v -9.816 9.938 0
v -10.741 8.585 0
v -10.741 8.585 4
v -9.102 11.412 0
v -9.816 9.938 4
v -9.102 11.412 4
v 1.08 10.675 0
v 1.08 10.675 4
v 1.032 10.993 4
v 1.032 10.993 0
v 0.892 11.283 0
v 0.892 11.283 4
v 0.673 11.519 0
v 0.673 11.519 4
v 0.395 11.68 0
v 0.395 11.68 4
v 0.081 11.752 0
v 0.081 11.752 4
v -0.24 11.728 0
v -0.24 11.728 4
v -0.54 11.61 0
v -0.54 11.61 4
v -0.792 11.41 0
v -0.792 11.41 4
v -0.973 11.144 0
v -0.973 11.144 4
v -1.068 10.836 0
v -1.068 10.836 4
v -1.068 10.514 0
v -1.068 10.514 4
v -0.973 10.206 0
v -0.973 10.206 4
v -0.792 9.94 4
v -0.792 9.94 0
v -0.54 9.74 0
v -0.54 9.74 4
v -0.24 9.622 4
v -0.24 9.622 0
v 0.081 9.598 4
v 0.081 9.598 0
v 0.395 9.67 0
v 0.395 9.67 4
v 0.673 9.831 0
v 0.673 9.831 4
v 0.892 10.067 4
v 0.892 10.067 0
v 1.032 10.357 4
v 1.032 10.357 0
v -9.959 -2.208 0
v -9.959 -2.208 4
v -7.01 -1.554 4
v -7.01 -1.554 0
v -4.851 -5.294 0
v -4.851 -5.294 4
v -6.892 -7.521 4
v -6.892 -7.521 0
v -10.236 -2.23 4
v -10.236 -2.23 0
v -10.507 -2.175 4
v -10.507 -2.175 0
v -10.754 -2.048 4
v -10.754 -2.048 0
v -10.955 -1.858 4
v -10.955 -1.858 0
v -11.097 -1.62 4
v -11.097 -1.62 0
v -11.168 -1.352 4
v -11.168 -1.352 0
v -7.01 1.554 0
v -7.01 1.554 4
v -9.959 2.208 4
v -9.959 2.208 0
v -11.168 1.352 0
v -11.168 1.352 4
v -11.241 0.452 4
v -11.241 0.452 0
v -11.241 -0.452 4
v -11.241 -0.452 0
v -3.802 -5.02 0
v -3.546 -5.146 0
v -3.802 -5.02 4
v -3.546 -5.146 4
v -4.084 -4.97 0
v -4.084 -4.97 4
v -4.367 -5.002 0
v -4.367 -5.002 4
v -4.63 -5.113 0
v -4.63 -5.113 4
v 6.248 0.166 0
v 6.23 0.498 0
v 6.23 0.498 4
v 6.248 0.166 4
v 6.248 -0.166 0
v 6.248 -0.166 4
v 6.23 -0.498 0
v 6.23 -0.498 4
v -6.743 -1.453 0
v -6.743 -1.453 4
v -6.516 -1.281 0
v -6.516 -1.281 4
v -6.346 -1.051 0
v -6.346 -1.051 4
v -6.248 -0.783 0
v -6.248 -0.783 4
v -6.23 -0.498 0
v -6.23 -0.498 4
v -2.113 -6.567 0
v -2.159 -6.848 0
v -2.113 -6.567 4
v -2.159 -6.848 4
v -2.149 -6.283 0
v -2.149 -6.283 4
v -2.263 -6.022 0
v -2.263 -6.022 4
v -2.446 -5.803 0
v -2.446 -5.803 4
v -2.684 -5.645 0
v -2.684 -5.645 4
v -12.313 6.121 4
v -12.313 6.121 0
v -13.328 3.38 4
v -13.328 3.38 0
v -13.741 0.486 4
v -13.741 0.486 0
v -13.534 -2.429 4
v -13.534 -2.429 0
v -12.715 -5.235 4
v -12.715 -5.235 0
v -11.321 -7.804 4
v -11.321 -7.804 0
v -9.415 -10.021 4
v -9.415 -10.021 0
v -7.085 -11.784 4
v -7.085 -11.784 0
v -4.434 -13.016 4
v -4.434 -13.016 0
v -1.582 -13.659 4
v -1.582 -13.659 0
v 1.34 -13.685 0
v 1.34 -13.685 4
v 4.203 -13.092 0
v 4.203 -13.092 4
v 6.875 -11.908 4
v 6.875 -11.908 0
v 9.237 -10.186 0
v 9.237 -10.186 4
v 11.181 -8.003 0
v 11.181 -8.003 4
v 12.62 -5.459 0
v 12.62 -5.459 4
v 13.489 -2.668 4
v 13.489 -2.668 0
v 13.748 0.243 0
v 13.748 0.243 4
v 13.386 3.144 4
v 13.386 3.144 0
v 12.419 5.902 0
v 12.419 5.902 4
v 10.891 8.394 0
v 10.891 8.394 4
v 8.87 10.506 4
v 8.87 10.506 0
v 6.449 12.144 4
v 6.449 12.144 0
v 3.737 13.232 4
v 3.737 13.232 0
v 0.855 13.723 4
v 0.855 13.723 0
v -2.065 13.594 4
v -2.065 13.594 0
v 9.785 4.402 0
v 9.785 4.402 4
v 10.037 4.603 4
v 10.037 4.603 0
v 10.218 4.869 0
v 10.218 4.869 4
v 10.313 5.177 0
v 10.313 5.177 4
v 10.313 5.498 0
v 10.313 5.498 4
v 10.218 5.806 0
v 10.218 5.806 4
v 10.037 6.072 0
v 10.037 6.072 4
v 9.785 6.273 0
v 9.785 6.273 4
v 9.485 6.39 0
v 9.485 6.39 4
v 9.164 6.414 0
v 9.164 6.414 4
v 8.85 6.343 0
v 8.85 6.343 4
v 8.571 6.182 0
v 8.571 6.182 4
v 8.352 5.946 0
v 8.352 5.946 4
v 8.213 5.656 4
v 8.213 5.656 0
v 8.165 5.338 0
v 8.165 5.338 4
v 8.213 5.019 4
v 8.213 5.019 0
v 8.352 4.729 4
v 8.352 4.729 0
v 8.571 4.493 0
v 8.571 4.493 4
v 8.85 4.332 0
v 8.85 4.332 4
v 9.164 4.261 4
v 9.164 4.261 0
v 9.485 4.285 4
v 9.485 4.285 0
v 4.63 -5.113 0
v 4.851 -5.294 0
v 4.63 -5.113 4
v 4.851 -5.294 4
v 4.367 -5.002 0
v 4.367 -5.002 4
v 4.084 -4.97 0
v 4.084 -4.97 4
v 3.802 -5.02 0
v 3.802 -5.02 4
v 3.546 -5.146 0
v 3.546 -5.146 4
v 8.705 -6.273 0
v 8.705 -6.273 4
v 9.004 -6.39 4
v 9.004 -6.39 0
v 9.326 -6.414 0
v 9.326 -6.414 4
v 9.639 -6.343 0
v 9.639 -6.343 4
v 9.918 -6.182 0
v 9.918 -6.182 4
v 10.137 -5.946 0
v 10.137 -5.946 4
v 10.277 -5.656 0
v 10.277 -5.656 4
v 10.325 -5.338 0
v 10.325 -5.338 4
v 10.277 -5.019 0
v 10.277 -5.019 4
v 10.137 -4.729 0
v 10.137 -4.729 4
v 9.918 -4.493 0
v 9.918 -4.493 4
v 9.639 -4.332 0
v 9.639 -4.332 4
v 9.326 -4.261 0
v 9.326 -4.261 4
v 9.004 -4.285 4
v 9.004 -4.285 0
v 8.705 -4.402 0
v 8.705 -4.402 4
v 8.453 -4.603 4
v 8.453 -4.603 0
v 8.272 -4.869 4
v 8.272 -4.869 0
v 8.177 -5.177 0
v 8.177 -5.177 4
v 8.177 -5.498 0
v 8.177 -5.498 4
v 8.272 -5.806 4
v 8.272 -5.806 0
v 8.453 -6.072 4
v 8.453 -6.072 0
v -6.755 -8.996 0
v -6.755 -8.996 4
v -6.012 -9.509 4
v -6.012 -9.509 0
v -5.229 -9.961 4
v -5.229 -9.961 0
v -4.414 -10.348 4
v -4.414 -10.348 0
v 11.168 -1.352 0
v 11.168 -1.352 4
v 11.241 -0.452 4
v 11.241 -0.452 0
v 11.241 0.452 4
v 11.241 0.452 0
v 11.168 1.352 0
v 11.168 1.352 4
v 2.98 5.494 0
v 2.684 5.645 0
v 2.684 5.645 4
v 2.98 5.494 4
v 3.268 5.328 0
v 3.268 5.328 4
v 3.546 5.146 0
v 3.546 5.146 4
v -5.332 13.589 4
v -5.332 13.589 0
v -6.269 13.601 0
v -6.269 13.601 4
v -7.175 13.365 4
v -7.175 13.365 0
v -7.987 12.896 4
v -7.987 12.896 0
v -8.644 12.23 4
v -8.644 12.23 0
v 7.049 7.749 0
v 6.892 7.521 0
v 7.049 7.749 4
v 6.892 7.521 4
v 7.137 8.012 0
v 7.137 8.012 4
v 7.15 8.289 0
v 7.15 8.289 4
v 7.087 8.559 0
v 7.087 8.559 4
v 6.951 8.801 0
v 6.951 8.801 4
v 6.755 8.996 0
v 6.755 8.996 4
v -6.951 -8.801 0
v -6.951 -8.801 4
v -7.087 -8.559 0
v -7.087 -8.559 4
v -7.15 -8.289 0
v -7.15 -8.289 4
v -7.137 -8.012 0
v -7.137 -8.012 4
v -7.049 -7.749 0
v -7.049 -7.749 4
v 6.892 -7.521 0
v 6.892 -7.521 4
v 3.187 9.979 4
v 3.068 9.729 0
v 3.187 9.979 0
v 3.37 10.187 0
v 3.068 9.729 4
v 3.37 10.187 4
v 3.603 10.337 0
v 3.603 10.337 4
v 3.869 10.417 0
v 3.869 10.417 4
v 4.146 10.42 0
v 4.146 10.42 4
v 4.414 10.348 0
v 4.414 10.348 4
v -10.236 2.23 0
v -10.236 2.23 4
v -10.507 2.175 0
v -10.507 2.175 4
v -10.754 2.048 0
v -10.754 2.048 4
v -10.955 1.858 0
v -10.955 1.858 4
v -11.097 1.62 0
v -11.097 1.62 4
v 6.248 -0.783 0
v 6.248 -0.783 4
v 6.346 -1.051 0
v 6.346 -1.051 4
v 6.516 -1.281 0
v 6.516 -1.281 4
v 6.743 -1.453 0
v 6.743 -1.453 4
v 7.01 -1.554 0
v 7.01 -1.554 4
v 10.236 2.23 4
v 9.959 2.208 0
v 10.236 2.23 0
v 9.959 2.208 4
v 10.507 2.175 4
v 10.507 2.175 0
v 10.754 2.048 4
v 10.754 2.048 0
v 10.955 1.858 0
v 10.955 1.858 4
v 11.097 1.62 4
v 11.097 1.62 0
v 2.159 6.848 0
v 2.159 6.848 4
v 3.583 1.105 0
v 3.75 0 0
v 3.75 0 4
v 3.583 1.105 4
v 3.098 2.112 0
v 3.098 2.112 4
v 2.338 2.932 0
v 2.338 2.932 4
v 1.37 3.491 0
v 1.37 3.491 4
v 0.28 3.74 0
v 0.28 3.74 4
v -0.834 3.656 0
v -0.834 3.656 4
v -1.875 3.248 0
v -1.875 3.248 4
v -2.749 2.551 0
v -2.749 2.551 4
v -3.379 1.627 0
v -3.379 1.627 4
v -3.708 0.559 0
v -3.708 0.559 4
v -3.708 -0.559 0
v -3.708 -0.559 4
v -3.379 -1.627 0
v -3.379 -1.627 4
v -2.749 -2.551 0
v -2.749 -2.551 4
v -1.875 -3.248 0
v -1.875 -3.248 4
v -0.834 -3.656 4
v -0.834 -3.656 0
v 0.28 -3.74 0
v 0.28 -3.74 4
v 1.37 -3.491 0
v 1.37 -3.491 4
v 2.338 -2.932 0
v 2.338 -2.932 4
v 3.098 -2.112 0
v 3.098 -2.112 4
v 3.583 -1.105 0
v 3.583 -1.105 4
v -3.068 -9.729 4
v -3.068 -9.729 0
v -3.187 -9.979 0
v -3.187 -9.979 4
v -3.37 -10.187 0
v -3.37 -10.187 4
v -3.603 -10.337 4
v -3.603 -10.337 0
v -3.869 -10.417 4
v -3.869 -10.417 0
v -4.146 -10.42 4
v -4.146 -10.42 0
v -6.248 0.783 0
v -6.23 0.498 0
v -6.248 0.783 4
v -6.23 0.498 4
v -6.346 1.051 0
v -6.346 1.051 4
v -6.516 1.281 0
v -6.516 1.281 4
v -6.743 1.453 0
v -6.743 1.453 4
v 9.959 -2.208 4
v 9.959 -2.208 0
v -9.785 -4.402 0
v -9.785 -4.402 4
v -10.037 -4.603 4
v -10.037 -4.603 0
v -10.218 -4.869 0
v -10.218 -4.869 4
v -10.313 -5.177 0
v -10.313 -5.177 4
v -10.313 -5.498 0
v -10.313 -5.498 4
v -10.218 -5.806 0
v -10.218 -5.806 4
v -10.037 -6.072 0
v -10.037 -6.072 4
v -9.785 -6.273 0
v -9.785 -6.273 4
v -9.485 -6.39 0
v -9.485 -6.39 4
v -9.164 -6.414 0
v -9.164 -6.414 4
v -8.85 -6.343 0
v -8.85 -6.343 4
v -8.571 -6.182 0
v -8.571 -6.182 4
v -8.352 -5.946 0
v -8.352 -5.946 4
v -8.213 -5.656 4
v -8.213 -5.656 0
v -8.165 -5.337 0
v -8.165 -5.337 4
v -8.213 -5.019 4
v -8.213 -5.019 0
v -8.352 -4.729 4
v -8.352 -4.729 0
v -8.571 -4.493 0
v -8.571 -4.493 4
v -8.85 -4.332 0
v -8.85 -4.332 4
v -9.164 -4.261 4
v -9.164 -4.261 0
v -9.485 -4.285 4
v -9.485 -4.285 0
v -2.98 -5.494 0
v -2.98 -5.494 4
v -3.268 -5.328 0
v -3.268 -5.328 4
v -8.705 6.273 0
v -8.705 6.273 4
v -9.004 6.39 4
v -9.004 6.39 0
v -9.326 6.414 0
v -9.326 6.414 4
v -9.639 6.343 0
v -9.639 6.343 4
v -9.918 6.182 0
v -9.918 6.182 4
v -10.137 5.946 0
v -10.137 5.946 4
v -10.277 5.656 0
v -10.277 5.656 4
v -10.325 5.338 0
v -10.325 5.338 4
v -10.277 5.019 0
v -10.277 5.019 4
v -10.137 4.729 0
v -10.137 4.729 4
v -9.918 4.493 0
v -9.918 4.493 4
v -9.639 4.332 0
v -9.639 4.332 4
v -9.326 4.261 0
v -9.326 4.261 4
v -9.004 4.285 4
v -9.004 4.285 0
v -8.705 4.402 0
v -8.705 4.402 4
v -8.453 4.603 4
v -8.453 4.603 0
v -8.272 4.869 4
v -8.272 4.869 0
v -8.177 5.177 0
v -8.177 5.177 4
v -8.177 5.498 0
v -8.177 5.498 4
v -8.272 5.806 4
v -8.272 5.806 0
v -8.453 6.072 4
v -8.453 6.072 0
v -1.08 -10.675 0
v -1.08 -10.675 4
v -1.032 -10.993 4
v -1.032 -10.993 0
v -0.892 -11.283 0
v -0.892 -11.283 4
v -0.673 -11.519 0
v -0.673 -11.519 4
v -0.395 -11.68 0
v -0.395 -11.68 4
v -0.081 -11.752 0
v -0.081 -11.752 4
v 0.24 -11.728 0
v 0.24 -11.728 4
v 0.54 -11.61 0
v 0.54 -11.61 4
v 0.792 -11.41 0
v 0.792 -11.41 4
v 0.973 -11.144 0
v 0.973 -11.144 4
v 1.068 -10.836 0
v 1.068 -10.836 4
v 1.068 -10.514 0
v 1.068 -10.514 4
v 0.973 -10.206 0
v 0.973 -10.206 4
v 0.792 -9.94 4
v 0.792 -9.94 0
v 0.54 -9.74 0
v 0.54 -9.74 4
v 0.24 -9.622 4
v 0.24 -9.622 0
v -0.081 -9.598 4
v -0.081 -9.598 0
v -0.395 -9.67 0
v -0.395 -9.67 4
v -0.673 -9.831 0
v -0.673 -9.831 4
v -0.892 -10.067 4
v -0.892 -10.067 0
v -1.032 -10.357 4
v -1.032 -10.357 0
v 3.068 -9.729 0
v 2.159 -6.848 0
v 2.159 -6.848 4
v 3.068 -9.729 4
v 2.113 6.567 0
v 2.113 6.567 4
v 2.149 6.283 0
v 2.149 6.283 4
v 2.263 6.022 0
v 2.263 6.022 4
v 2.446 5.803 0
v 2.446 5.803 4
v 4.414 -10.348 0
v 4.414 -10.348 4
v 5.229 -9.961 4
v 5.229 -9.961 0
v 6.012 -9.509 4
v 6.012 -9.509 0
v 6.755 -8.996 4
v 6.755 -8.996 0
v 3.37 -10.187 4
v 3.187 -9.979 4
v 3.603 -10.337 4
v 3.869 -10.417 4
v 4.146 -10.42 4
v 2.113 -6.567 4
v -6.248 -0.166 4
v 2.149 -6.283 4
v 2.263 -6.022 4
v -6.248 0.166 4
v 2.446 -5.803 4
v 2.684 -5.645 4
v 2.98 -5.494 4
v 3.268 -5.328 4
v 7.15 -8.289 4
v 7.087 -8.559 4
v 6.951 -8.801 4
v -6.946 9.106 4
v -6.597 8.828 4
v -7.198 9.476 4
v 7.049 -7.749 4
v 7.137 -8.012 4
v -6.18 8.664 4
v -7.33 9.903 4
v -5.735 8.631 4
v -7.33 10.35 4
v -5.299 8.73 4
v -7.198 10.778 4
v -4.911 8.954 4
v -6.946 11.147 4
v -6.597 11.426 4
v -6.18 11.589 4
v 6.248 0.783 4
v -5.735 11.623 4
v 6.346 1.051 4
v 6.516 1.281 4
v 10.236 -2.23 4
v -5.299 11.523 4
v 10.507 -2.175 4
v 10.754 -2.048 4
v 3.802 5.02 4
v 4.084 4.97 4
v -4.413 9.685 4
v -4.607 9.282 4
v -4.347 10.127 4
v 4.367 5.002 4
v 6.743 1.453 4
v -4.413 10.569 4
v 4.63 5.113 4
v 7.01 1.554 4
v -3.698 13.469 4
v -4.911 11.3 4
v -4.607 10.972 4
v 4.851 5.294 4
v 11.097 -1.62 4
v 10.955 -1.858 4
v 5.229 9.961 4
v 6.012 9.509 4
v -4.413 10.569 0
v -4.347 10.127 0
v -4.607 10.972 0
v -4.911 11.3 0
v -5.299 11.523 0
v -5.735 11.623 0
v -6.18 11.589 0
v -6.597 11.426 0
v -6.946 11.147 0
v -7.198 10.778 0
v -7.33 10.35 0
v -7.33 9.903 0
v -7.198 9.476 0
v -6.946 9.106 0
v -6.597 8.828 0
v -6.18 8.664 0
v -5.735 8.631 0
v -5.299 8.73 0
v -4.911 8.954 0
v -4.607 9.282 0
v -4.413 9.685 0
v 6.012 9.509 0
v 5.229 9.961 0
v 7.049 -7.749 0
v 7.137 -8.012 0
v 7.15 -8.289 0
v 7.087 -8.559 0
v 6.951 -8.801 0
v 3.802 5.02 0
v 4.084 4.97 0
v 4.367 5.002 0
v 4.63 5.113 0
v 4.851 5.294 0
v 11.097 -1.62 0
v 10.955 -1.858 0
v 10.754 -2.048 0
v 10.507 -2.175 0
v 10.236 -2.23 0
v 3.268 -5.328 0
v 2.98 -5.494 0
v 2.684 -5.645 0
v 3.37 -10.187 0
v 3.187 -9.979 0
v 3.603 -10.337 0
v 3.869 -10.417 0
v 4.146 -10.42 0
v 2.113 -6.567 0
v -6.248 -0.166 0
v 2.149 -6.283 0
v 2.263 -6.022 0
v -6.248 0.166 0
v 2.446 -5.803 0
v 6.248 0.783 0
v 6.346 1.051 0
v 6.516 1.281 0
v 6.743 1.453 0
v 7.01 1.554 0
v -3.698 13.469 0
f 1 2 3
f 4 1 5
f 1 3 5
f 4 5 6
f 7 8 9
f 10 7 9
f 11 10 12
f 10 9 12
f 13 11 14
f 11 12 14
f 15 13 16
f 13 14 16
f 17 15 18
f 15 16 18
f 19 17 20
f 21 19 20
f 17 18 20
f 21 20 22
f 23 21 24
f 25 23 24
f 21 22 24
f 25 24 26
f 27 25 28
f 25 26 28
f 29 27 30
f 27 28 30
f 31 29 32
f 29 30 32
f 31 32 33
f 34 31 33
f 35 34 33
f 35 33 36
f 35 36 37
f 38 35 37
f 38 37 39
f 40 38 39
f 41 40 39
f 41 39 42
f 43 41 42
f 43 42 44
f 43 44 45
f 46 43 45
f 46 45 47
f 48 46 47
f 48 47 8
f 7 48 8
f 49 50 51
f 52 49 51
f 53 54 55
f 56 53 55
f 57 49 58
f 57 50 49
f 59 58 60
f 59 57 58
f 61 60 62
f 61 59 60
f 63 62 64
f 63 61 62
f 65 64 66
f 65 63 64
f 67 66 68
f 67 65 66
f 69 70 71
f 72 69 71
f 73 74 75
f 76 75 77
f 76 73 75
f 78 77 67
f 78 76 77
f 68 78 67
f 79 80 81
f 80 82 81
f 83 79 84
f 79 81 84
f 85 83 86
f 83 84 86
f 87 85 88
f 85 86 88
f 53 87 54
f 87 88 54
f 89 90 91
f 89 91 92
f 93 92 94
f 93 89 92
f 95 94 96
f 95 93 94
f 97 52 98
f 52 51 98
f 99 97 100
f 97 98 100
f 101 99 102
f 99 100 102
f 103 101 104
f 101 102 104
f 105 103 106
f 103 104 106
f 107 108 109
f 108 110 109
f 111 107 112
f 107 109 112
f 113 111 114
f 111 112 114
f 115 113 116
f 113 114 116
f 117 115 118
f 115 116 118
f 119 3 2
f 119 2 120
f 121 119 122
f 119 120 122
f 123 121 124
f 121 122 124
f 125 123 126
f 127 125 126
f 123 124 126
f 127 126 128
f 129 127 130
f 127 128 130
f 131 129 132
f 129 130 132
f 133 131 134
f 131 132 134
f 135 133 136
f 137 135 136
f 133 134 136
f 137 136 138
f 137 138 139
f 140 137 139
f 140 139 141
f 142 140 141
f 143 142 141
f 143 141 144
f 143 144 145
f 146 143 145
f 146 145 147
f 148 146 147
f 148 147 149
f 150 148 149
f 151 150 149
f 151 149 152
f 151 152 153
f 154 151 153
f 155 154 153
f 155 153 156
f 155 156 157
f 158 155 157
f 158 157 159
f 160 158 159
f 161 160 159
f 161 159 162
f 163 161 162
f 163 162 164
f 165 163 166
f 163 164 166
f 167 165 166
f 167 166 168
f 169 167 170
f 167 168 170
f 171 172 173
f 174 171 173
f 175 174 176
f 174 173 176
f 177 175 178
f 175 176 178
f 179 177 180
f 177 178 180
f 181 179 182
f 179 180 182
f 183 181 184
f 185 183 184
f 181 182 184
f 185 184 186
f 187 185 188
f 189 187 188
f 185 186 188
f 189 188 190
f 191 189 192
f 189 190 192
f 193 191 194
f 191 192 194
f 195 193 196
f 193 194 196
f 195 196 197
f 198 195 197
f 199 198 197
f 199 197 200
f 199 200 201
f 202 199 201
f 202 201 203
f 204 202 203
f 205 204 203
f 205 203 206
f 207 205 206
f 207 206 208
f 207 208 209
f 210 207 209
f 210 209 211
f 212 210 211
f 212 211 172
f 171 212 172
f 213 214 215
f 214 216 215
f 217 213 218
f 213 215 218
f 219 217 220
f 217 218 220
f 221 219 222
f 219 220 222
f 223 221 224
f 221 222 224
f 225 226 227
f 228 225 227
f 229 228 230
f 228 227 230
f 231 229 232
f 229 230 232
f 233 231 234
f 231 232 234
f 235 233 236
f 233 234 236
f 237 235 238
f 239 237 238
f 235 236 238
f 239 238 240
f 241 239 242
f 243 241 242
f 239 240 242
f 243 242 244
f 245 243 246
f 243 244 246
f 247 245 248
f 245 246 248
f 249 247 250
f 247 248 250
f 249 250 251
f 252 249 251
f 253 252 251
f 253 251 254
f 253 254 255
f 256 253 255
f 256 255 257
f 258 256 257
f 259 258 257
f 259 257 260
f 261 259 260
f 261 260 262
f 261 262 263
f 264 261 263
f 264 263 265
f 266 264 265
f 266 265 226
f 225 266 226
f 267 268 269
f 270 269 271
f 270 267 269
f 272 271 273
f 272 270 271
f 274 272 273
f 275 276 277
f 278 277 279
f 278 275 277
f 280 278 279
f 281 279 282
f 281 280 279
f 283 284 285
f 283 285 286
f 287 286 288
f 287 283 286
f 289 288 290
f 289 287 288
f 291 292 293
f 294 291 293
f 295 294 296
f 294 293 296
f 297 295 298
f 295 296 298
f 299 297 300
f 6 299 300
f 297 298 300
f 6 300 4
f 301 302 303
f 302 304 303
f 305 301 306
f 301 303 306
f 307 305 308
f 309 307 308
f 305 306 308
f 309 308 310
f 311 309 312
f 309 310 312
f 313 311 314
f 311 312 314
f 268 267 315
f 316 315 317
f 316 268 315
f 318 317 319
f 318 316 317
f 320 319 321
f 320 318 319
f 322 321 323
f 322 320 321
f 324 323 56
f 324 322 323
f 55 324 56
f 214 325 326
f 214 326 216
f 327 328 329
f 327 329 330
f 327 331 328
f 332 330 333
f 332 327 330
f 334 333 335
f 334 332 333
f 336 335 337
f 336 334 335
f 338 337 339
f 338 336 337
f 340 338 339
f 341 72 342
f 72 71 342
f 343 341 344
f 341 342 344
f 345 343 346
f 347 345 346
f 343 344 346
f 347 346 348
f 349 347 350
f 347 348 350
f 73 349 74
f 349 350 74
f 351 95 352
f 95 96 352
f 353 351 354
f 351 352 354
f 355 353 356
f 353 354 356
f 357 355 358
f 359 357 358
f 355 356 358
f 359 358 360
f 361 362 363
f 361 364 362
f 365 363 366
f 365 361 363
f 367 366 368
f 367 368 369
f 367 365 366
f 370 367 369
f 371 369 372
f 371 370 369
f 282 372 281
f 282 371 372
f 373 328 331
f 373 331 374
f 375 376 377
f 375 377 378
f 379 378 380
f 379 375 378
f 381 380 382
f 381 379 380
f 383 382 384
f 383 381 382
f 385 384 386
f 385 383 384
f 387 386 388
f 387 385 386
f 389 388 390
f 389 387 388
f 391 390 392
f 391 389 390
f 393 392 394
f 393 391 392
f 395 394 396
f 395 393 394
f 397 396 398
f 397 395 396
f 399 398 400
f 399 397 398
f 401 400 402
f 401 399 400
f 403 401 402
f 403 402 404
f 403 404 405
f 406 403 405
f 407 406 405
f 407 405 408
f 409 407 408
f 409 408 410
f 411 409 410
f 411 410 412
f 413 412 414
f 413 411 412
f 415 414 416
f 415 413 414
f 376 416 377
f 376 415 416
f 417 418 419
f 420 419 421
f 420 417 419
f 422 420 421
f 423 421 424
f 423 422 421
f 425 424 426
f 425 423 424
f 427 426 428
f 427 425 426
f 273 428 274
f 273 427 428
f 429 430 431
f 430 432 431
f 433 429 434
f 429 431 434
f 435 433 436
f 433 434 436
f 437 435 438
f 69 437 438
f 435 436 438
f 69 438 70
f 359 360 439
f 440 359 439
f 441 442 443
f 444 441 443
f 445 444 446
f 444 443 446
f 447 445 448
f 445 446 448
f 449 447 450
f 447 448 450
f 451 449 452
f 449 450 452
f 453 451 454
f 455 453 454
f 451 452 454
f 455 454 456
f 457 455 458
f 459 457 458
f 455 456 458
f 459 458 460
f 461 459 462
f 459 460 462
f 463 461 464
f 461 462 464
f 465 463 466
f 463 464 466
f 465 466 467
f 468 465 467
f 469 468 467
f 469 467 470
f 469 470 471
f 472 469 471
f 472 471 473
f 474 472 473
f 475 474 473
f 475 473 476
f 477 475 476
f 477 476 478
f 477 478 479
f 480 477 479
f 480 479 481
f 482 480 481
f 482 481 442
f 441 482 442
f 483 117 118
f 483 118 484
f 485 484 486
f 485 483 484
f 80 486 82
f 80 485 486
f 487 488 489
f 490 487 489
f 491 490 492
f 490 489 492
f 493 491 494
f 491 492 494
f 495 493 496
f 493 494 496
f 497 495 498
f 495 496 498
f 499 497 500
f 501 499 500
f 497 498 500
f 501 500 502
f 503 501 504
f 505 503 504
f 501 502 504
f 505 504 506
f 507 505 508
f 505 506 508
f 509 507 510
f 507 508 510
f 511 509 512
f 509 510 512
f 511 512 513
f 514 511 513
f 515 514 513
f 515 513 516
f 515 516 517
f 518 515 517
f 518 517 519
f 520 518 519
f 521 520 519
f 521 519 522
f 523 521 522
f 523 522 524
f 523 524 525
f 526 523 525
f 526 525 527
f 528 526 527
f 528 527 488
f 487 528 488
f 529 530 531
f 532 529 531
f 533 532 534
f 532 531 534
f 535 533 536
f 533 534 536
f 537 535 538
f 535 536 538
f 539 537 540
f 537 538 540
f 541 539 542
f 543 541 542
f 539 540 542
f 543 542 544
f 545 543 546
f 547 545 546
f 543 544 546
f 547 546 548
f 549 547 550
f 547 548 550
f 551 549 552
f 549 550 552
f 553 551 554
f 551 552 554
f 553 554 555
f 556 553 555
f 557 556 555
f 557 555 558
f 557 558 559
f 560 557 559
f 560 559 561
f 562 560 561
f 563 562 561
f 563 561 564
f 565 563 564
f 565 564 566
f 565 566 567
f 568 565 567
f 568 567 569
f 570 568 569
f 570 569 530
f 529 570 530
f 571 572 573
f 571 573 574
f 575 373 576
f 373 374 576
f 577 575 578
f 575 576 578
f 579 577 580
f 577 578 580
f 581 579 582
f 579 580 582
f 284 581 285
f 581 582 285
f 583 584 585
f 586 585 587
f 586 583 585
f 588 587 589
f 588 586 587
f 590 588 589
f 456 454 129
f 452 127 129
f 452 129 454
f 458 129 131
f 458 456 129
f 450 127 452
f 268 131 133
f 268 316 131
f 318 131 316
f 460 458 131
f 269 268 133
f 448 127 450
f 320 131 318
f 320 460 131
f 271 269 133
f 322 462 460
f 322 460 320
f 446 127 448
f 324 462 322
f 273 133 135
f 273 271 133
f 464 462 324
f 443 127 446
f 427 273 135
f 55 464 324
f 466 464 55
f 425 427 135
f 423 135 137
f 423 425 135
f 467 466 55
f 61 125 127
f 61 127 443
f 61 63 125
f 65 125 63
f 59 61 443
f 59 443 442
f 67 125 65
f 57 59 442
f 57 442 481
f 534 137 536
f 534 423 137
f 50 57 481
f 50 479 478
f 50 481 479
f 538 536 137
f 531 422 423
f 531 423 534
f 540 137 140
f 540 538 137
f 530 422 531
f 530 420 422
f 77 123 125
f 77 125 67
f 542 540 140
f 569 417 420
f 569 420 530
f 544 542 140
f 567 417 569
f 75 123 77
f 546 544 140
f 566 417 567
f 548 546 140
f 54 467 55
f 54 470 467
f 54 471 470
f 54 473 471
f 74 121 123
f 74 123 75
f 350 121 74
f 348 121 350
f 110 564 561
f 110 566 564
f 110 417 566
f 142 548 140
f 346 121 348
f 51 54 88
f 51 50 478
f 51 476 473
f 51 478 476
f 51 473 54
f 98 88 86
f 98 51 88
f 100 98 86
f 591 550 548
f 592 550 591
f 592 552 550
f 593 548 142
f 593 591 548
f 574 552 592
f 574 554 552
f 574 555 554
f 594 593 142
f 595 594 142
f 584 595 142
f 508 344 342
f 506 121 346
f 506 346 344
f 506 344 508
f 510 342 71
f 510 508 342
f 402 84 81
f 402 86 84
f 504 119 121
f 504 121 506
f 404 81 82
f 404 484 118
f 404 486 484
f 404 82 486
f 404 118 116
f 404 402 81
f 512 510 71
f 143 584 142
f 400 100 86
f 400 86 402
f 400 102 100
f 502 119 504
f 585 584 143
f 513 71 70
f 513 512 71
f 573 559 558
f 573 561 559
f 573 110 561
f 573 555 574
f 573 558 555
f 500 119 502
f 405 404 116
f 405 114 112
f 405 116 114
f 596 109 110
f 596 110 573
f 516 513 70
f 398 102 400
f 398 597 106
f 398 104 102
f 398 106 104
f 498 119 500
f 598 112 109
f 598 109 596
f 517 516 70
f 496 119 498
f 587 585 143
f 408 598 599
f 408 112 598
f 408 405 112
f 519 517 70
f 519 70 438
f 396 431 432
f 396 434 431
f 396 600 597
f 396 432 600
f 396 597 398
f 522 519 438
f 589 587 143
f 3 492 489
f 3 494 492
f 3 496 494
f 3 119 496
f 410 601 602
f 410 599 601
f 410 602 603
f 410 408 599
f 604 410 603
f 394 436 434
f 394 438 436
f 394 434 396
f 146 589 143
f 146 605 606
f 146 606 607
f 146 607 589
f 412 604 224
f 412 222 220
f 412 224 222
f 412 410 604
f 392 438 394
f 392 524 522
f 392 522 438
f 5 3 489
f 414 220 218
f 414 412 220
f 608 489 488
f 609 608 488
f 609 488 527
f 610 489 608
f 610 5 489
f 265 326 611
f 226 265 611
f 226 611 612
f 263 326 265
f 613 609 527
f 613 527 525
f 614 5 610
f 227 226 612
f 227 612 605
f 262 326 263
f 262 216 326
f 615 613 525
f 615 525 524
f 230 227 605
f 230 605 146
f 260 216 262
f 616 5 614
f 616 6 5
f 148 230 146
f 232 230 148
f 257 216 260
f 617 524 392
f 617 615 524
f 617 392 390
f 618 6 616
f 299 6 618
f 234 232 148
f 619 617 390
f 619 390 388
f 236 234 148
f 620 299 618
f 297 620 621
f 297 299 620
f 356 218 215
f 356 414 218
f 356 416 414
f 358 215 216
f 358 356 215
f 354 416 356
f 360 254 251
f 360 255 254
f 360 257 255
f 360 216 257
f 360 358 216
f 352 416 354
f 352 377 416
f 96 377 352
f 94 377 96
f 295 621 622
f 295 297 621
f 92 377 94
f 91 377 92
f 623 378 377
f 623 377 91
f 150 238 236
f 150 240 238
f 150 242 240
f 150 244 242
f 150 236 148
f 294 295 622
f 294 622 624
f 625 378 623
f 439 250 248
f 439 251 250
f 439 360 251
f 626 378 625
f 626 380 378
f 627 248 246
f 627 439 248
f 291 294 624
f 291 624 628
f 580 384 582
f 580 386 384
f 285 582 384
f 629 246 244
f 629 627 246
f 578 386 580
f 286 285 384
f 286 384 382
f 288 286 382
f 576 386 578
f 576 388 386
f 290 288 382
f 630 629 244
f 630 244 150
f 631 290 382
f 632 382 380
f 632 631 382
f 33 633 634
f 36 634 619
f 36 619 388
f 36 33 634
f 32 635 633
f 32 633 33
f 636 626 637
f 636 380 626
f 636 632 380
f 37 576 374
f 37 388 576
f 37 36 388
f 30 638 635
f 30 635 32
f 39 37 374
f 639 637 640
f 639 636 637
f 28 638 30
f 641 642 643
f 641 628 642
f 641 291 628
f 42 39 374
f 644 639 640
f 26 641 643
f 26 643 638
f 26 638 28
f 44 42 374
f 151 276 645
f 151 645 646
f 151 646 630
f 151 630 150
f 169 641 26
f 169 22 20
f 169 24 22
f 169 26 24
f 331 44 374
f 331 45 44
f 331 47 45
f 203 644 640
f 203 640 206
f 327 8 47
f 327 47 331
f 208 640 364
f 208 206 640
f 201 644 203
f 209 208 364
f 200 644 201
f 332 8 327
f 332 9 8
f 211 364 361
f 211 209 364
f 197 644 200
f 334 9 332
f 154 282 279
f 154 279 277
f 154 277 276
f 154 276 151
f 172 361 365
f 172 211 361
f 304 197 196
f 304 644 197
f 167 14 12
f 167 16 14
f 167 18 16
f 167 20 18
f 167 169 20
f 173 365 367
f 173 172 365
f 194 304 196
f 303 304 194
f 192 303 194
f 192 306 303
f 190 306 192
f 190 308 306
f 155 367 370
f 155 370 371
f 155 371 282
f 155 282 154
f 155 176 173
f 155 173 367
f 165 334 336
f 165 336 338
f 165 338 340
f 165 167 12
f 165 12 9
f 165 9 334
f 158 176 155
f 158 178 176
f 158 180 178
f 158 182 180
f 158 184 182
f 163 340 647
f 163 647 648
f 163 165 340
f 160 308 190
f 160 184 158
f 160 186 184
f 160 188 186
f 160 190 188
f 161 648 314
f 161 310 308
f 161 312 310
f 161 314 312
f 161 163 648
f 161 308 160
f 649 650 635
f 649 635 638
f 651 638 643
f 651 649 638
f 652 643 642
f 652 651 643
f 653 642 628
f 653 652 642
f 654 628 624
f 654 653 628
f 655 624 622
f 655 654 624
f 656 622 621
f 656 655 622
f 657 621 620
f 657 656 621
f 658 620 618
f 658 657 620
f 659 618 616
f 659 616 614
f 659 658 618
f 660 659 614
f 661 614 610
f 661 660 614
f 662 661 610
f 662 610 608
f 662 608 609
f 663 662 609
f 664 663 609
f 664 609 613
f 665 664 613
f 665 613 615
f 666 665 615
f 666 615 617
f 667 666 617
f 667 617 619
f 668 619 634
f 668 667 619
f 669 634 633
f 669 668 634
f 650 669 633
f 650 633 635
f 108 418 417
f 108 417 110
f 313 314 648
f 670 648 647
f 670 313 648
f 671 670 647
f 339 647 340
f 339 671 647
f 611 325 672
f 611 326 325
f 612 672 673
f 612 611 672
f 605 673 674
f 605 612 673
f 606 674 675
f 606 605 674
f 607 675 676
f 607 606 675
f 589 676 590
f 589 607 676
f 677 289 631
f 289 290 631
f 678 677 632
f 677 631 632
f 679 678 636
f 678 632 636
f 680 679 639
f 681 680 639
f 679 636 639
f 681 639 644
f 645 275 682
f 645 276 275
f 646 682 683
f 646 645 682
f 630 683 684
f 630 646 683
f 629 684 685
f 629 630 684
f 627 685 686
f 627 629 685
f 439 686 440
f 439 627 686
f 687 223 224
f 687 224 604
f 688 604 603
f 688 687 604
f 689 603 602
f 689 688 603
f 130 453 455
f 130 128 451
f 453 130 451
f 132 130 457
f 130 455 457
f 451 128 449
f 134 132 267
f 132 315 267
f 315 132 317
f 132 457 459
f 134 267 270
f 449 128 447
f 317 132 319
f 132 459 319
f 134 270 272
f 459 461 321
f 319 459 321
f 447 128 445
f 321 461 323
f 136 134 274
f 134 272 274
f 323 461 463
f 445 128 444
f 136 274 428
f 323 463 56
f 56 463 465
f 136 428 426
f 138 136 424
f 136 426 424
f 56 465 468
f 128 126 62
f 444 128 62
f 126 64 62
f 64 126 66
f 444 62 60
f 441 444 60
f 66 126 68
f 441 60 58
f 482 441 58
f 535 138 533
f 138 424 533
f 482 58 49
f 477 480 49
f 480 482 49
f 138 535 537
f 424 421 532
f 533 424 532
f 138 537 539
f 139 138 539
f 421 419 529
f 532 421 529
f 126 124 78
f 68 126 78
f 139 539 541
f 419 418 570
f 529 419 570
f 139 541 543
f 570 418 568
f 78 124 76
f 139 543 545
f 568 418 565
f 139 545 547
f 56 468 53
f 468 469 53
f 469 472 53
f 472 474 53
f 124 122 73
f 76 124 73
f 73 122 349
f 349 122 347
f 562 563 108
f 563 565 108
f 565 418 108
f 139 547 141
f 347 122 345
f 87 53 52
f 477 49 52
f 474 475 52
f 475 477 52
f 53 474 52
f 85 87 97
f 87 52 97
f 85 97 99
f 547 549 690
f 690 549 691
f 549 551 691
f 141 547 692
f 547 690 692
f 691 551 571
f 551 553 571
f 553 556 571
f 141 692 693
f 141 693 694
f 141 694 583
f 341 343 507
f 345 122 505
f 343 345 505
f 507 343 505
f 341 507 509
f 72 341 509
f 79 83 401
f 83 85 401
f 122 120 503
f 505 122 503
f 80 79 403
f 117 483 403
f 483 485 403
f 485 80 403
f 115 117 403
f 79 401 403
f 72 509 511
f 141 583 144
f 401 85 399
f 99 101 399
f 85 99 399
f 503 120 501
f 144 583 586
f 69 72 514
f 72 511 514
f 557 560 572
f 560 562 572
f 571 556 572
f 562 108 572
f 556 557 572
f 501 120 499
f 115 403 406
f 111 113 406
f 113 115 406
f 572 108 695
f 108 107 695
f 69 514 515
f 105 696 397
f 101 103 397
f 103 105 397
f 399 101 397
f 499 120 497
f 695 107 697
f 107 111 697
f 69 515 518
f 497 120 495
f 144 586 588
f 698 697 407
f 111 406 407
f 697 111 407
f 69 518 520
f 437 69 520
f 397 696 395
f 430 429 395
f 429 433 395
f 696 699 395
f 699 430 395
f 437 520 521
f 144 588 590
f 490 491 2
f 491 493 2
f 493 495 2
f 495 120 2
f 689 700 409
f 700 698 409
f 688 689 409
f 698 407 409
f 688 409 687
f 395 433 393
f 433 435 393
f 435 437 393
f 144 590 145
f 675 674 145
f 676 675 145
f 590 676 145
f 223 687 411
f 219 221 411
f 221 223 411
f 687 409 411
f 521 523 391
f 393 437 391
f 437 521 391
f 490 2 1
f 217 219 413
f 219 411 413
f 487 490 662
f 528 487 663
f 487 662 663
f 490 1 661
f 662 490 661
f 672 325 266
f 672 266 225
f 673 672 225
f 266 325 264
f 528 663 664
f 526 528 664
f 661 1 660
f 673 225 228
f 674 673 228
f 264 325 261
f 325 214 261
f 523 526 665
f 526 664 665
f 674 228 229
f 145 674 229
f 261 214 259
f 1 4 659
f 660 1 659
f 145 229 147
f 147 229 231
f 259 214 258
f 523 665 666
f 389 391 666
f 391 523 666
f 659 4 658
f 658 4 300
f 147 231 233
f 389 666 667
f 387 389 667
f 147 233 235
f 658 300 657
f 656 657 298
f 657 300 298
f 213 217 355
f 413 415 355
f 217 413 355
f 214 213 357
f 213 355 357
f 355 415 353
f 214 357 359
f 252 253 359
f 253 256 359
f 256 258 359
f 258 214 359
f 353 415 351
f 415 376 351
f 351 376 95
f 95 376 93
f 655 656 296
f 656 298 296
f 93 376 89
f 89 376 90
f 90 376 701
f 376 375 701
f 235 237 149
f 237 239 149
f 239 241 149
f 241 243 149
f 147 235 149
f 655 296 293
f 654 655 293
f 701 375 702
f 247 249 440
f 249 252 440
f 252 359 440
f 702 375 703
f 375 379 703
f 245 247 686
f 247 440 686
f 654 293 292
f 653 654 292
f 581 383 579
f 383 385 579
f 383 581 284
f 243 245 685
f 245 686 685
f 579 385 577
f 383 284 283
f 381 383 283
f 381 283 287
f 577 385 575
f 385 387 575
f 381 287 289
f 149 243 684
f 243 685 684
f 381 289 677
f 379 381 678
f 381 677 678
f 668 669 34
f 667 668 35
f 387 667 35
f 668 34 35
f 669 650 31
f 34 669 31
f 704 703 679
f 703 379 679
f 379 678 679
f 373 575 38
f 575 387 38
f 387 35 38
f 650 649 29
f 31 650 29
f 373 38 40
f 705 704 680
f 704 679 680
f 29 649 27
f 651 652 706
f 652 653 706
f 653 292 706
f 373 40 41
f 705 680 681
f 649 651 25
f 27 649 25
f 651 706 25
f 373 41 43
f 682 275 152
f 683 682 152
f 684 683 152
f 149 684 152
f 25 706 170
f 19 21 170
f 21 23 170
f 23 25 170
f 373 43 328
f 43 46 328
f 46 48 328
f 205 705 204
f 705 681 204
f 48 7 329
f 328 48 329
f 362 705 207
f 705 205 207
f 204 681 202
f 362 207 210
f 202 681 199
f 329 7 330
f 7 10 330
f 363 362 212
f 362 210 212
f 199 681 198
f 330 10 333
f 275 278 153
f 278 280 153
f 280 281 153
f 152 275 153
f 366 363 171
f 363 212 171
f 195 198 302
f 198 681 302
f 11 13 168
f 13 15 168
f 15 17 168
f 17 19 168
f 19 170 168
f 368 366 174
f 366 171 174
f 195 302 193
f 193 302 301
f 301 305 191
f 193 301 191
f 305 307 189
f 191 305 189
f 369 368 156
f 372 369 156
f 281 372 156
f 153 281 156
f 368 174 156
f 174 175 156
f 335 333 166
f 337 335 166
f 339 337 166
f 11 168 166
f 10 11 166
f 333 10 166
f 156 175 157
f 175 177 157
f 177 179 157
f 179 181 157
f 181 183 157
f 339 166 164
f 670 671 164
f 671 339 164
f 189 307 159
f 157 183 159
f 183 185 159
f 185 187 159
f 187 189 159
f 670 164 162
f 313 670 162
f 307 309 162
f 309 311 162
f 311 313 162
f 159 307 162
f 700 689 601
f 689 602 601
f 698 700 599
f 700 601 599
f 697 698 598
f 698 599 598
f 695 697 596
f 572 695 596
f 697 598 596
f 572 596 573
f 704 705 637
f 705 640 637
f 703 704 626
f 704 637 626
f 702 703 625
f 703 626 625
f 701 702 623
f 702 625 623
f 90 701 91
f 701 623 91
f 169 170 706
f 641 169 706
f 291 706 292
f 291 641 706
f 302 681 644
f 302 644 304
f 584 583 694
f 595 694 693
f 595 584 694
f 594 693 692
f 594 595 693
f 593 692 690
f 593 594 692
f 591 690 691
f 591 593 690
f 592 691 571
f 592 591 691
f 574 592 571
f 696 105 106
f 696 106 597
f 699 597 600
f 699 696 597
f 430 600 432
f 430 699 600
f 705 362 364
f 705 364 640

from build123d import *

# Parameters (mm, degrees)
ESQUISSE1_R                        = 3.75
ESQUISSE1_R_2                      = 1.5
BOSS_EXTRU_1_DEPTH                 = 4
ENL_V_MAT_EXTRU_1_REACH            = 21.853
ESQUISSE2_R                        = 1.08
R_P_TITION_CIRCULAIRE1_COUNT       = 6
CONG_1_R                           = 11
ENL_V_MAT_EXTRU_2_REACH            = 21.853
CONG_2_R                           = 1
R_P_TITION_CIRCULAIRE2_COUNT       = 5
R_P_TITION_CIRCULAIRE2_ANGLE       = 240
CONG_2_OF_R_P_TITION_CIRCULAIRE2_R = 1


with BuildPart() as part:
    # Esquisse1 → Boss.-Extru.1 (new body)
    with BuildSketch(Plane.XY):
        with BuildLine():
            ThreePointArc((-9.34643428, 10.084972298), (6.875, -11.907849302), (-4.060625067, 13.13673567))
            ThreePointArc((-4.060625067, 13.13673567), (-7.596683666, 13.157842079), (-9.34643428, 10.084972298))
        make_face()
        Circle(ESQUISSE1_R, mode=Mode.SUBTRACT)
        with Locations((-5.846683666, 10.126753165)):
            Circle(ESQUISSE1_R_2, mode=Mode.SUBTRACT)
    extrude(amount=BOSS_EXTRU_1_DEPTH)

    # Esquisse2 → Enlèv. mat.-Extru.1 (cut, up to next)
    with BuildSketch(Plane.XY.offset(4), mode=Mode.PRIVATE) as enl_v_mat_extru_1_sk1:
        with Locations((0, 10.675)):
            Circle(ESQUISSE2_R)
    enl_v_mat_extru_1_tool1 = extrude(enl_v_mat_extru_1_sk1.sketch, amount=-ENL_V_MAT_EXTRU_1_REACH, mode=Mode.PRIVATE) & part.part
    enl_v_mat_extru_1 = enl_v_mat_extru_1_tool1.solids().sort_by_distance((0, 10.675, 4))[0]
    add(enl_v_mat_extru_1, mode=Mode.SUBTRACT)

    # Répétition circulaire1: Enlèv. mat.-Extru.1 ×6 about axis
    r_p_tition_circulaire1_axis = Axis((0, 0, 0), (0, 0, 1))
    for i in range(1, R_P_TITION_CIRCULAIRE1_COUNT):
        add(enl_v_mat_extru_1.rotate(r_p_tition_circulaire1_axis, i * 360 / R_P_TITION_CIRCULAIRE1_COUNT), mode=Mode.SUBTRACT)

    # Congé1
    cong_1_edges = [part.edges().sort_by_distance(p)[0] for p in [
        (-4.060625067, 13.13673567, 2),
        (-9.34643428, 10.084972298, 2),
    ]]
    fillet(cong_1_edges, radius=CONG_1_R)

    # Esquisse3 → Enlèv. mat.-Extru.2 (cut, up to next)
    with BuildSketch(Plane(origin=(0, 0, 0), x_dir=(-1, 0, 0), z_dir=(0, 0, -1)), mode=Mode.PRIVATE) as enl_v_mat_extru_2_sk1:
        with BuildLine():
            Line((-3.382940244, 10.729315696), (-1.879411247, 5.960730942))
            ThreePointArc((-1.879411247, 5.960730942), (-3.125, 5.412658774), (-4.222438798, 4.607983355))
            Line((-4.222438798, 4.607983355), (-7.600389836, 8.294370039))
            ThreePointArc((-7.600389836, 8.294370039), (-5.625, 9.742785793), (-3.382940244, 10.729315696))
        make_face()
    enl_v_mat_extru_2_tool1 = extrude(enl_v_mat_extru_2_sk1.sketch, amount=-ENL_V_MAT_EXTRU_2_REACH, mode=Mode.PRIVATE) & part.part
    enl_v_mat_extru_2 = enl_v_mat_extru_2_tool1.solids().sort_by_distance((4.458482, 7.722318, 0))[0]
    add(enl_v_mat_extru_2, mode=Mode.SUBTRACT)

    # Congé2
    cong_2_edges = [part.edges().sort_by_distance(p)[0] for p in [
        (7.600389836, 8.294370039, 2),
        (3.382940244, 10.729315696, 2),
        (1.879411247, 5.960730942, 2),
        (4.222438798, 4.607983355, 2),
    ]]
    fillet(cong_2_edges, radius=CONG_2_R)

    # Répétition circulaire2: Enlèv. mat.-Extru.2 ×5 about axis
    r_p_tition_circulaire2_axis = Axis((0, 0, 0), (0, 0, -1))
    for i in range(1, R_P_TITION_CIRCULAIRE2_COUNT):
        add(enl_v_mat_extru_2.rotate(r_p_tition_circulaire2_axis, i * R_P_TITION_CIRCULAIRE2_ANGLE / (R_P_TITION_CIRCULAIRE2_COUNT - 1)), mode=Mode.SUBTRACT)

    # Congé2 of Répétition circulaire2
    cong_2_of_r_p_tition_circulaire2_edges = [part.edges().sort_by_distance(p)[0] for p in [
        (10.98333008, -2.434945657, 2),
        (10.98333008, 2.434945657, 2),
        (6.101850044, 1.352747587, 2),
        (6.101850044, -1.352747587, 2),
        (3.382940244, -10.729315696, 2),
        (7.600389836, -8.294370039, 2),
        (4.222438798, -4.607983355, 2),
        (1.879411247, -5.960730942, 2),
        (-7.600389836, -8.294370039, 2),
        (-3.382940244, -10.729315696, 2),
        (-1.879411247, -5.960730942, 2),
        (-4.222438798, -4.607983355, 2),
        (-10.98333008, 2.434945657, 2),
        (-10.98333008, -2.434945657, 2),
        (-6.101850044, -1.352747587, 2),
        (-6.101850044, 1.352747587, 2),
    ]]
    fillet(cong_2_of_r_p_tition_circulaire2_edges, radius=CONG_2_OF_R_P_TITION_CIRCULAIRE2_R)


solid = part.part
